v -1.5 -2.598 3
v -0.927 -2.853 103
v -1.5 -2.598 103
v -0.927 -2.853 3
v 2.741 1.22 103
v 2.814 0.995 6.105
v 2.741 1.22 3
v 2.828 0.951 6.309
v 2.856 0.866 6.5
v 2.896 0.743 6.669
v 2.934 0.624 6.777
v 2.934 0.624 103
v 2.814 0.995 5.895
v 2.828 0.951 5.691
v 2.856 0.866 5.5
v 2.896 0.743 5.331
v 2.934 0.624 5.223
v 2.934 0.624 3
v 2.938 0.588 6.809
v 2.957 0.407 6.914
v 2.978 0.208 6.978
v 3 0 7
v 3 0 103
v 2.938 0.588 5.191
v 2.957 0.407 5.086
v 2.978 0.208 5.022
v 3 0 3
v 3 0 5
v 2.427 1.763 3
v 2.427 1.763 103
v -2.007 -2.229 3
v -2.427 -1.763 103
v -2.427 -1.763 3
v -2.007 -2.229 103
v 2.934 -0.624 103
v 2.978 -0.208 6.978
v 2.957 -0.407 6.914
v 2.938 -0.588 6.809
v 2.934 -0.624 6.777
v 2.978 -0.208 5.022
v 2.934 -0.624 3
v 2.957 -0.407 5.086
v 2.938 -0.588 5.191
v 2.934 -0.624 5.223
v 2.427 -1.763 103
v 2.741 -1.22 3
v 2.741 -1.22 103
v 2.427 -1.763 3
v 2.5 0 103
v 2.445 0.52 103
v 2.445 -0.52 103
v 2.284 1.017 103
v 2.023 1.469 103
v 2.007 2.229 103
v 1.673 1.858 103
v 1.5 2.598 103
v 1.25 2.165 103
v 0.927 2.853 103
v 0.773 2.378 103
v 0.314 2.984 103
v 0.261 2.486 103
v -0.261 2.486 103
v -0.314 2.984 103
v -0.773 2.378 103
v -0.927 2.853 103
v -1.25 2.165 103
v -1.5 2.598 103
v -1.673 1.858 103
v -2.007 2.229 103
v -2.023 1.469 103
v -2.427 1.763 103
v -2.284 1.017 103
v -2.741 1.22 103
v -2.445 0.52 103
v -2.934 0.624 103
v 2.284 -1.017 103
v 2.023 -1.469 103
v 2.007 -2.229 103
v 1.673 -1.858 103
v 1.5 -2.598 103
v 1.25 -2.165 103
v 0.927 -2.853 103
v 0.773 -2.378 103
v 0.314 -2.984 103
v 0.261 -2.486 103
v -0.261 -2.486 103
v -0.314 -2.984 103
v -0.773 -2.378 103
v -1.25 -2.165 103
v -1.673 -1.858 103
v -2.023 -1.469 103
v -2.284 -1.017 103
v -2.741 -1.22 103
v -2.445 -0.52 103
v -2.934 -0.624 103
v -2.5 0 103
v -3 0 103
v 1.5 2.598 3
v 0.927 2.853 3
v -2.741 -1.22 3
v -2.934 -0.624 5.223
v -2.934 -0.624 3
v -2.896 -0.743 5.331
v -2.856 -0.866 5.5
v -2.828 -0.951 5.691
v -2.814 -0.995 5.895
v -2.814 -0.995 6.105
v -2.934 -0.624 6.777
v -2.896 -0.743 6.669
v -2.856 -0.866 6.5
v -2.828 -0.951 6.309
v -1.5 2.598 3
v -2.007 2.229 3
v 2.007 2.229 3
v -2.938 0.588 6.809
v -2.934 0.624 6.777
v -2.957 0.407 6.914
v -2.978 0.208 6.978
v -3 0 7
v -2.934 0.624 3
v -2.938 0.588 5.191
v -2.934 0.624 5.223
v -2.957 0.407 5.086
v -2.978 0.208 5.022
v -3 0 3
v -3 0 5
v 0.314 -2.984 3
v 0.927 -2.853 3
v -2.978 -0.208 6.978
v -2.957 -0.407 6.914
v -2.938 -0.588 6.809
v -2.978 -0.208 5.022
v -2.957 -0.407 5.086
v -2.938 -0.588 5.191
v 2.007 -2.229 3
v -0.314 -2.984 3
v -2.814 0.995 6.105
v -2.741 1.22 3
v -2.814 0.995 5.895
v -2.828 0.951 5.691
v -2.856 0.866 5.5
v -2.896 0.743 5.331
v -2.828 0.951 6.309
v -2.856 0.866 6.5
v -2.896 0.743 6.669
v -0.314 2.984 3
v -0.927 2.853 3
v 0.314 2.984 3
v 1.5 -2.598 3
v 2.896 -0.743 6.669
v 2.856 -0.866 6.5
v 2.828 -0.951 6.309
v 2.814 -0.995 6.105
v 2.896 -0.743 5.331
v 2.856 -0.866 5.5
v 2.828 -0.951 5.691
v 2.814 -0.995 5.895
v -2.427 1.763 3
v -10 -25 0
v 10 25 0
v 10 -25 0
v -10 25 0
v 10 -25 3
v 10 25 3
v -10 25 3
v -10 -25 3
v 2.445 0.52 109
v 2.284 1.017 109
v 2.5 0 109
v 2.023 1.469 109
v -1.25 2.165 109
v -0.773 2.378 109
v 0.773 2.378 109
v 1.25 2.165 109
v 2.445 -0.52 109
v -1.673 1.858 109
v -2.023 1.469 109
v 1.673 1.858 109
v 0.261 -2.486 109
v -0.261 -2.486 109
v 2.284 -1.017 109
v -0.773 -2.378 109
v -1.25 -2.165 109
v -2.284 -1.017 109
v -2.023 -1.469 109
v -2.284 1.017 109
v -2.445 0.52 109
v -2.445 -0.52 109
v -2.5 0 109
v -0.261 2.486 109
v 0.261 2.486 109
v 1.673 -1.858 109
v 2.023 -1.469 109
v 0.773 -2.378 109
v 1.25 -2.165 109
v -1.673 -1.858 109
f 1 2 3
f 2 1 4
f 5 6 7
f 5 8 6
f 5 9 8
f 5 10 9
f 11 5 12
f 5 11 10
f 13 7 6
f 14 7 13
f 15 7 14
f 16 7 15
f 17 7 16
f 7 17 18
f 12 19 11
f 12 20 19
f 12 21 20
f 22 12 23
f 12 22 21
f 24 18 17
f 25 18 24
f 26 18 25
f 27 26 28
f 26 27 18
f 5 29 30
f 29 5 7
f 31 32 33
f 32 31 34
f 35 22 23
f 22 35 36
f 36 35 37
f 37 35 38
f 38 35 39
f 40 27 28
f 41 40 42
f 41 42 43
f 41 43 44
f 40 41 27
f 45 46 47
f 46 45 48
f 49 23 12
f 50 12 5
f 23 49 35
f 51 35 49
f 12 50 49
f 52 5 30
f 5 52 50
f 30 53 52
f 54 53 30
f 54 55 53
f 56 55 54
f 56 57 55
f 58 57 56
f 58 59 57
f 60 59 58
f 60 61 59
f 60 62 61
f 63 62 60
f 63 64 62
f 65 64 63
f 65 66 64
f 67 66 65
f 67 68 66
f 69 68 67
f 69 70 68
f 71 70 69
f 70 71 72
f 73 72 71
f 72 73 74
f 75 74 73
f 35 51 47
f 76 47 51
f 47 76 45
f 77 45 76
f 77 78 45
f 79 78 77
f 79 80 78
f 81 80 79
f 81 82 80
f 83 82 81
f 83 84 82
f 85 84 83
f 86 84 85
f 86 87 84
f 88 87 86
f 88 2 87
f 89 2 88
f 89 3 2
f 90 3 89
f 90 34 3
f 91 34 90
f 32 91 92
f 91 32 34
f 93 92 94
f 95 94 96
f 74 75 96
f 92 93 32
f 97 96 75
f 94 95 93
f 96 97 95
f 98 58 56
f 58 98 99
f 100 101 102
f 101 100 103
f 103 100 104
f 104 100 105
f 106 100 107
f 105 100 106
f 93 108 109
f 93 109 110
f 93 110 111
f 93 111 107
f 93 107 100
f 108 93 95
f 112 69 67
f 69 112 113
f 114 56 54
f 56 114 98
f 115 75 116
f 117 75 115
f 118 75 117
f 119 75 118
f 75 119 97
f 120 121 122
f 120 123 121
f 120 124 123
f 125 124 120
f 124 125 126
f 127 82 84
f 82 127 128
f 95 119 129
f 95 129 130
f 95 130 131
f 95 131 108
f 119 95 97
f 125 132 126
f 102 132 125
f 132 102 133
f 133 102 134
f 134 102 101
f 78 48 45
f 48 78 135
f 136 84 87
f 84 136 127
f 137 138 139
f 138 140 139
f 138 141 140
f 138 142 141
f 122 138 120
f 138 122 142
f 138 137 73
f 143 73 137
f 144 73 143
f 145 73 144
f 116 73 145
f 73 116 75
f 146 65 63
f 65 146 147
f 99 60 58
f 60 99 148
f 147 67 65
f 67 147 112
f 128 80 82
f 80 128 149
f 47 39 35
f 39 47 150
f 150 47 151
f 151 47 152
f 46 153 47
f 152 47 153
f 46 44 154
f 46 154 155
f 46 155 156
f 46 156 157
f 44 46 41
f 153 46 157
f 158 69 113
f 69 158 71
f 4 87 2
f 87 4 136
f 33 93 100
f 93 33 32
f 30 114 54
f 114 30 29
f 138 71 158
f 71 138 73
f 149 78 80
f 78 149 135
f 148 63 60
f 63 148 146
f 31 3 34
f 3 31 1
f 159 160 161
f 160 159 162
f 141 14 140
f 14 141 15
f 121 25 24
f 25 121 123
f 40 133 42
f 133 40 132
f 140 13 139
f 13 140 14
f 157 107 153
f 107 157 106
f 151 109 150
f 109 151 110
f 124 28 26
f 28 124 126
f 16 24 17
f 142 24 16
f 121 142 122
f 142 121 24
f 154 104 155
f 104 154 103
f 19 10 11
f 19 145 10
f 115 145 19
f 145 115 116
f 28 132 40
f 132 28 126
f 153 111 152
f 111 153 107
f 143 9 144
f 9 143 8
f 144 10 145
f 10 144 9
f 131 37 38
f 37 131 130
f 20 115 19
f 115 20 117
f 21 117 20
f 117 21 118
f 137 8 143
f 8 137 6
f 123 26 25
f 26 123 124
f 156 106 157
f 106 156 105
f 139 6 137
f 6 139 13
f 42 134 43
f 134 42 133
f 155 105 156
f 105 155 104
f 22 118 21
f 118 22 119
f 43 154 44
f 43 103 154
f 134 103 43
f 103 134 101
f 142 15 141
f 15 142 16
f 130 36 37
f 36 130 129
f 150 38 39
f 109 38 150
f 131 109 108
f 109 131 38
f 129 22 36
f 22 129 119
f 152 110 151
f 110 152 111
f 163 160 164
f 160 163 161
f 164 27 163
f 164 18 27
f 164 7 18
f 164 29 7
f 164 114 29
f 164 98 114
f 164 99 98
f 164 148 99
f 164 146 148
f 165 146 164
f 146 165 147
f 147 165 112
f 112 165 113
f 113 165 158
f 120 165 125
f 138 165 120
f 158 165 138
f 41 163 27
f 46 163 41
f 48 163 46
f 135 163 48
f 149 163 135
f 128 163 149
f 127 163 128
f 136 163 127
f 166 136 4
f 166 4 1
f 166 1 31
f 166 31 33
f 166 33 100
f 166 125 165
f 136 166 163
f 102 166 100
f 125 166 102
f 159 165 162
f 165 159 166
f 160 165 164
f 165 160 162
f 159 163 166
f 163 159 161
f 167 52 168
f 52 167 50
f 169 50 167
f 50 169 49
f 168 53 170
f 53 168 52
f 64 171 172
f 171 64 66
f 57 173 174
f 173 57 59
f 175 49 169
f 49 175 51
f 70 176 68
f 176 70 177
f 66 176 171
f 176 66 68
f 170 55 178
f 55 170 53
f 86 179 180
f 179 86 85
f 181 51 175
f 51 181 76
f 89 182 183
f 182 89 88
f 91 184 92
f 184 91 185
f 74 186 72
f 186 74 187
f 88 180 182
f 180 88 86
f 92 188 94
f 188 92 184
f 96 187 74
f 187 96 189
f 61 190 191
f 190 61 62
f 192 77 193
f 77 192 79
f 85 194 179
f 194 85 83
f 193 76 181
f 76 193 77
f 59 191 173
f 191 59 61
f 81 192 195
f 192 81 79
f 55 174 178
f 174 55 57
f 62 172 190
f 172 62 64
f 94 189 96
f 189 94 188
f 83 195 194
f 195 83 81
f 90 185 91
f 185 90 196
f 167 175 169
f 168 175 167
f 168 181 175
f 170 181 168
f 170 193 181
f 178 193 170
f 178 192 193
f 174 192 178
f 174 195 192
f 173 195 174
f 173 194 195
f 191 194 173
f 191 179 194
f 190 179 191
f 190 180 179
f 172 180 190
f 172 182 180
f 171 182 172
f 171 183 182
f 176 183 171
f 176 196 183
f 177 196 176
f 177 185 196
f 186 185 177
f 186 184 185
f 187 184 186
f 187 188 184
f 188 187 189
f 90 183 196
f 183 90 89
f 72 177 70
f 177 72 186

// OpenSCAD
M = 100;
epsilon = 0.01;

wall_thickness = 3;

drive_fit_width = 20;
drive_fit_length = 50;

chuck_fit_diameter = 5;
chuck_fit_length = 6;

diameter = 6;
length = 100;

wire_hole_diameter = 2;

$fs = 0.1;

difference() {
  //the actual mandrel
  cylinder(d = diameter, h=wall_thickness+length);

  //the slot that the wire fixes into at the end
  translate([0,0,wall_thickness*2])
  rotate([0,90,0])
  cylinder(d=wire_hole_diameter, h=M, center = true);
}

//the rectangular piece that fits onto the drive mount
translate([0,0,wall_thickness/2])
  cube([drive_fit_width, drive_fit_length, wall_thickness], center = true);

//the circular fit that goes into the chuck mount
translate([0,0,wall_thickness+length])
  cylinder(d = chuck_fit_diameter, h=chuck_fit_length);
